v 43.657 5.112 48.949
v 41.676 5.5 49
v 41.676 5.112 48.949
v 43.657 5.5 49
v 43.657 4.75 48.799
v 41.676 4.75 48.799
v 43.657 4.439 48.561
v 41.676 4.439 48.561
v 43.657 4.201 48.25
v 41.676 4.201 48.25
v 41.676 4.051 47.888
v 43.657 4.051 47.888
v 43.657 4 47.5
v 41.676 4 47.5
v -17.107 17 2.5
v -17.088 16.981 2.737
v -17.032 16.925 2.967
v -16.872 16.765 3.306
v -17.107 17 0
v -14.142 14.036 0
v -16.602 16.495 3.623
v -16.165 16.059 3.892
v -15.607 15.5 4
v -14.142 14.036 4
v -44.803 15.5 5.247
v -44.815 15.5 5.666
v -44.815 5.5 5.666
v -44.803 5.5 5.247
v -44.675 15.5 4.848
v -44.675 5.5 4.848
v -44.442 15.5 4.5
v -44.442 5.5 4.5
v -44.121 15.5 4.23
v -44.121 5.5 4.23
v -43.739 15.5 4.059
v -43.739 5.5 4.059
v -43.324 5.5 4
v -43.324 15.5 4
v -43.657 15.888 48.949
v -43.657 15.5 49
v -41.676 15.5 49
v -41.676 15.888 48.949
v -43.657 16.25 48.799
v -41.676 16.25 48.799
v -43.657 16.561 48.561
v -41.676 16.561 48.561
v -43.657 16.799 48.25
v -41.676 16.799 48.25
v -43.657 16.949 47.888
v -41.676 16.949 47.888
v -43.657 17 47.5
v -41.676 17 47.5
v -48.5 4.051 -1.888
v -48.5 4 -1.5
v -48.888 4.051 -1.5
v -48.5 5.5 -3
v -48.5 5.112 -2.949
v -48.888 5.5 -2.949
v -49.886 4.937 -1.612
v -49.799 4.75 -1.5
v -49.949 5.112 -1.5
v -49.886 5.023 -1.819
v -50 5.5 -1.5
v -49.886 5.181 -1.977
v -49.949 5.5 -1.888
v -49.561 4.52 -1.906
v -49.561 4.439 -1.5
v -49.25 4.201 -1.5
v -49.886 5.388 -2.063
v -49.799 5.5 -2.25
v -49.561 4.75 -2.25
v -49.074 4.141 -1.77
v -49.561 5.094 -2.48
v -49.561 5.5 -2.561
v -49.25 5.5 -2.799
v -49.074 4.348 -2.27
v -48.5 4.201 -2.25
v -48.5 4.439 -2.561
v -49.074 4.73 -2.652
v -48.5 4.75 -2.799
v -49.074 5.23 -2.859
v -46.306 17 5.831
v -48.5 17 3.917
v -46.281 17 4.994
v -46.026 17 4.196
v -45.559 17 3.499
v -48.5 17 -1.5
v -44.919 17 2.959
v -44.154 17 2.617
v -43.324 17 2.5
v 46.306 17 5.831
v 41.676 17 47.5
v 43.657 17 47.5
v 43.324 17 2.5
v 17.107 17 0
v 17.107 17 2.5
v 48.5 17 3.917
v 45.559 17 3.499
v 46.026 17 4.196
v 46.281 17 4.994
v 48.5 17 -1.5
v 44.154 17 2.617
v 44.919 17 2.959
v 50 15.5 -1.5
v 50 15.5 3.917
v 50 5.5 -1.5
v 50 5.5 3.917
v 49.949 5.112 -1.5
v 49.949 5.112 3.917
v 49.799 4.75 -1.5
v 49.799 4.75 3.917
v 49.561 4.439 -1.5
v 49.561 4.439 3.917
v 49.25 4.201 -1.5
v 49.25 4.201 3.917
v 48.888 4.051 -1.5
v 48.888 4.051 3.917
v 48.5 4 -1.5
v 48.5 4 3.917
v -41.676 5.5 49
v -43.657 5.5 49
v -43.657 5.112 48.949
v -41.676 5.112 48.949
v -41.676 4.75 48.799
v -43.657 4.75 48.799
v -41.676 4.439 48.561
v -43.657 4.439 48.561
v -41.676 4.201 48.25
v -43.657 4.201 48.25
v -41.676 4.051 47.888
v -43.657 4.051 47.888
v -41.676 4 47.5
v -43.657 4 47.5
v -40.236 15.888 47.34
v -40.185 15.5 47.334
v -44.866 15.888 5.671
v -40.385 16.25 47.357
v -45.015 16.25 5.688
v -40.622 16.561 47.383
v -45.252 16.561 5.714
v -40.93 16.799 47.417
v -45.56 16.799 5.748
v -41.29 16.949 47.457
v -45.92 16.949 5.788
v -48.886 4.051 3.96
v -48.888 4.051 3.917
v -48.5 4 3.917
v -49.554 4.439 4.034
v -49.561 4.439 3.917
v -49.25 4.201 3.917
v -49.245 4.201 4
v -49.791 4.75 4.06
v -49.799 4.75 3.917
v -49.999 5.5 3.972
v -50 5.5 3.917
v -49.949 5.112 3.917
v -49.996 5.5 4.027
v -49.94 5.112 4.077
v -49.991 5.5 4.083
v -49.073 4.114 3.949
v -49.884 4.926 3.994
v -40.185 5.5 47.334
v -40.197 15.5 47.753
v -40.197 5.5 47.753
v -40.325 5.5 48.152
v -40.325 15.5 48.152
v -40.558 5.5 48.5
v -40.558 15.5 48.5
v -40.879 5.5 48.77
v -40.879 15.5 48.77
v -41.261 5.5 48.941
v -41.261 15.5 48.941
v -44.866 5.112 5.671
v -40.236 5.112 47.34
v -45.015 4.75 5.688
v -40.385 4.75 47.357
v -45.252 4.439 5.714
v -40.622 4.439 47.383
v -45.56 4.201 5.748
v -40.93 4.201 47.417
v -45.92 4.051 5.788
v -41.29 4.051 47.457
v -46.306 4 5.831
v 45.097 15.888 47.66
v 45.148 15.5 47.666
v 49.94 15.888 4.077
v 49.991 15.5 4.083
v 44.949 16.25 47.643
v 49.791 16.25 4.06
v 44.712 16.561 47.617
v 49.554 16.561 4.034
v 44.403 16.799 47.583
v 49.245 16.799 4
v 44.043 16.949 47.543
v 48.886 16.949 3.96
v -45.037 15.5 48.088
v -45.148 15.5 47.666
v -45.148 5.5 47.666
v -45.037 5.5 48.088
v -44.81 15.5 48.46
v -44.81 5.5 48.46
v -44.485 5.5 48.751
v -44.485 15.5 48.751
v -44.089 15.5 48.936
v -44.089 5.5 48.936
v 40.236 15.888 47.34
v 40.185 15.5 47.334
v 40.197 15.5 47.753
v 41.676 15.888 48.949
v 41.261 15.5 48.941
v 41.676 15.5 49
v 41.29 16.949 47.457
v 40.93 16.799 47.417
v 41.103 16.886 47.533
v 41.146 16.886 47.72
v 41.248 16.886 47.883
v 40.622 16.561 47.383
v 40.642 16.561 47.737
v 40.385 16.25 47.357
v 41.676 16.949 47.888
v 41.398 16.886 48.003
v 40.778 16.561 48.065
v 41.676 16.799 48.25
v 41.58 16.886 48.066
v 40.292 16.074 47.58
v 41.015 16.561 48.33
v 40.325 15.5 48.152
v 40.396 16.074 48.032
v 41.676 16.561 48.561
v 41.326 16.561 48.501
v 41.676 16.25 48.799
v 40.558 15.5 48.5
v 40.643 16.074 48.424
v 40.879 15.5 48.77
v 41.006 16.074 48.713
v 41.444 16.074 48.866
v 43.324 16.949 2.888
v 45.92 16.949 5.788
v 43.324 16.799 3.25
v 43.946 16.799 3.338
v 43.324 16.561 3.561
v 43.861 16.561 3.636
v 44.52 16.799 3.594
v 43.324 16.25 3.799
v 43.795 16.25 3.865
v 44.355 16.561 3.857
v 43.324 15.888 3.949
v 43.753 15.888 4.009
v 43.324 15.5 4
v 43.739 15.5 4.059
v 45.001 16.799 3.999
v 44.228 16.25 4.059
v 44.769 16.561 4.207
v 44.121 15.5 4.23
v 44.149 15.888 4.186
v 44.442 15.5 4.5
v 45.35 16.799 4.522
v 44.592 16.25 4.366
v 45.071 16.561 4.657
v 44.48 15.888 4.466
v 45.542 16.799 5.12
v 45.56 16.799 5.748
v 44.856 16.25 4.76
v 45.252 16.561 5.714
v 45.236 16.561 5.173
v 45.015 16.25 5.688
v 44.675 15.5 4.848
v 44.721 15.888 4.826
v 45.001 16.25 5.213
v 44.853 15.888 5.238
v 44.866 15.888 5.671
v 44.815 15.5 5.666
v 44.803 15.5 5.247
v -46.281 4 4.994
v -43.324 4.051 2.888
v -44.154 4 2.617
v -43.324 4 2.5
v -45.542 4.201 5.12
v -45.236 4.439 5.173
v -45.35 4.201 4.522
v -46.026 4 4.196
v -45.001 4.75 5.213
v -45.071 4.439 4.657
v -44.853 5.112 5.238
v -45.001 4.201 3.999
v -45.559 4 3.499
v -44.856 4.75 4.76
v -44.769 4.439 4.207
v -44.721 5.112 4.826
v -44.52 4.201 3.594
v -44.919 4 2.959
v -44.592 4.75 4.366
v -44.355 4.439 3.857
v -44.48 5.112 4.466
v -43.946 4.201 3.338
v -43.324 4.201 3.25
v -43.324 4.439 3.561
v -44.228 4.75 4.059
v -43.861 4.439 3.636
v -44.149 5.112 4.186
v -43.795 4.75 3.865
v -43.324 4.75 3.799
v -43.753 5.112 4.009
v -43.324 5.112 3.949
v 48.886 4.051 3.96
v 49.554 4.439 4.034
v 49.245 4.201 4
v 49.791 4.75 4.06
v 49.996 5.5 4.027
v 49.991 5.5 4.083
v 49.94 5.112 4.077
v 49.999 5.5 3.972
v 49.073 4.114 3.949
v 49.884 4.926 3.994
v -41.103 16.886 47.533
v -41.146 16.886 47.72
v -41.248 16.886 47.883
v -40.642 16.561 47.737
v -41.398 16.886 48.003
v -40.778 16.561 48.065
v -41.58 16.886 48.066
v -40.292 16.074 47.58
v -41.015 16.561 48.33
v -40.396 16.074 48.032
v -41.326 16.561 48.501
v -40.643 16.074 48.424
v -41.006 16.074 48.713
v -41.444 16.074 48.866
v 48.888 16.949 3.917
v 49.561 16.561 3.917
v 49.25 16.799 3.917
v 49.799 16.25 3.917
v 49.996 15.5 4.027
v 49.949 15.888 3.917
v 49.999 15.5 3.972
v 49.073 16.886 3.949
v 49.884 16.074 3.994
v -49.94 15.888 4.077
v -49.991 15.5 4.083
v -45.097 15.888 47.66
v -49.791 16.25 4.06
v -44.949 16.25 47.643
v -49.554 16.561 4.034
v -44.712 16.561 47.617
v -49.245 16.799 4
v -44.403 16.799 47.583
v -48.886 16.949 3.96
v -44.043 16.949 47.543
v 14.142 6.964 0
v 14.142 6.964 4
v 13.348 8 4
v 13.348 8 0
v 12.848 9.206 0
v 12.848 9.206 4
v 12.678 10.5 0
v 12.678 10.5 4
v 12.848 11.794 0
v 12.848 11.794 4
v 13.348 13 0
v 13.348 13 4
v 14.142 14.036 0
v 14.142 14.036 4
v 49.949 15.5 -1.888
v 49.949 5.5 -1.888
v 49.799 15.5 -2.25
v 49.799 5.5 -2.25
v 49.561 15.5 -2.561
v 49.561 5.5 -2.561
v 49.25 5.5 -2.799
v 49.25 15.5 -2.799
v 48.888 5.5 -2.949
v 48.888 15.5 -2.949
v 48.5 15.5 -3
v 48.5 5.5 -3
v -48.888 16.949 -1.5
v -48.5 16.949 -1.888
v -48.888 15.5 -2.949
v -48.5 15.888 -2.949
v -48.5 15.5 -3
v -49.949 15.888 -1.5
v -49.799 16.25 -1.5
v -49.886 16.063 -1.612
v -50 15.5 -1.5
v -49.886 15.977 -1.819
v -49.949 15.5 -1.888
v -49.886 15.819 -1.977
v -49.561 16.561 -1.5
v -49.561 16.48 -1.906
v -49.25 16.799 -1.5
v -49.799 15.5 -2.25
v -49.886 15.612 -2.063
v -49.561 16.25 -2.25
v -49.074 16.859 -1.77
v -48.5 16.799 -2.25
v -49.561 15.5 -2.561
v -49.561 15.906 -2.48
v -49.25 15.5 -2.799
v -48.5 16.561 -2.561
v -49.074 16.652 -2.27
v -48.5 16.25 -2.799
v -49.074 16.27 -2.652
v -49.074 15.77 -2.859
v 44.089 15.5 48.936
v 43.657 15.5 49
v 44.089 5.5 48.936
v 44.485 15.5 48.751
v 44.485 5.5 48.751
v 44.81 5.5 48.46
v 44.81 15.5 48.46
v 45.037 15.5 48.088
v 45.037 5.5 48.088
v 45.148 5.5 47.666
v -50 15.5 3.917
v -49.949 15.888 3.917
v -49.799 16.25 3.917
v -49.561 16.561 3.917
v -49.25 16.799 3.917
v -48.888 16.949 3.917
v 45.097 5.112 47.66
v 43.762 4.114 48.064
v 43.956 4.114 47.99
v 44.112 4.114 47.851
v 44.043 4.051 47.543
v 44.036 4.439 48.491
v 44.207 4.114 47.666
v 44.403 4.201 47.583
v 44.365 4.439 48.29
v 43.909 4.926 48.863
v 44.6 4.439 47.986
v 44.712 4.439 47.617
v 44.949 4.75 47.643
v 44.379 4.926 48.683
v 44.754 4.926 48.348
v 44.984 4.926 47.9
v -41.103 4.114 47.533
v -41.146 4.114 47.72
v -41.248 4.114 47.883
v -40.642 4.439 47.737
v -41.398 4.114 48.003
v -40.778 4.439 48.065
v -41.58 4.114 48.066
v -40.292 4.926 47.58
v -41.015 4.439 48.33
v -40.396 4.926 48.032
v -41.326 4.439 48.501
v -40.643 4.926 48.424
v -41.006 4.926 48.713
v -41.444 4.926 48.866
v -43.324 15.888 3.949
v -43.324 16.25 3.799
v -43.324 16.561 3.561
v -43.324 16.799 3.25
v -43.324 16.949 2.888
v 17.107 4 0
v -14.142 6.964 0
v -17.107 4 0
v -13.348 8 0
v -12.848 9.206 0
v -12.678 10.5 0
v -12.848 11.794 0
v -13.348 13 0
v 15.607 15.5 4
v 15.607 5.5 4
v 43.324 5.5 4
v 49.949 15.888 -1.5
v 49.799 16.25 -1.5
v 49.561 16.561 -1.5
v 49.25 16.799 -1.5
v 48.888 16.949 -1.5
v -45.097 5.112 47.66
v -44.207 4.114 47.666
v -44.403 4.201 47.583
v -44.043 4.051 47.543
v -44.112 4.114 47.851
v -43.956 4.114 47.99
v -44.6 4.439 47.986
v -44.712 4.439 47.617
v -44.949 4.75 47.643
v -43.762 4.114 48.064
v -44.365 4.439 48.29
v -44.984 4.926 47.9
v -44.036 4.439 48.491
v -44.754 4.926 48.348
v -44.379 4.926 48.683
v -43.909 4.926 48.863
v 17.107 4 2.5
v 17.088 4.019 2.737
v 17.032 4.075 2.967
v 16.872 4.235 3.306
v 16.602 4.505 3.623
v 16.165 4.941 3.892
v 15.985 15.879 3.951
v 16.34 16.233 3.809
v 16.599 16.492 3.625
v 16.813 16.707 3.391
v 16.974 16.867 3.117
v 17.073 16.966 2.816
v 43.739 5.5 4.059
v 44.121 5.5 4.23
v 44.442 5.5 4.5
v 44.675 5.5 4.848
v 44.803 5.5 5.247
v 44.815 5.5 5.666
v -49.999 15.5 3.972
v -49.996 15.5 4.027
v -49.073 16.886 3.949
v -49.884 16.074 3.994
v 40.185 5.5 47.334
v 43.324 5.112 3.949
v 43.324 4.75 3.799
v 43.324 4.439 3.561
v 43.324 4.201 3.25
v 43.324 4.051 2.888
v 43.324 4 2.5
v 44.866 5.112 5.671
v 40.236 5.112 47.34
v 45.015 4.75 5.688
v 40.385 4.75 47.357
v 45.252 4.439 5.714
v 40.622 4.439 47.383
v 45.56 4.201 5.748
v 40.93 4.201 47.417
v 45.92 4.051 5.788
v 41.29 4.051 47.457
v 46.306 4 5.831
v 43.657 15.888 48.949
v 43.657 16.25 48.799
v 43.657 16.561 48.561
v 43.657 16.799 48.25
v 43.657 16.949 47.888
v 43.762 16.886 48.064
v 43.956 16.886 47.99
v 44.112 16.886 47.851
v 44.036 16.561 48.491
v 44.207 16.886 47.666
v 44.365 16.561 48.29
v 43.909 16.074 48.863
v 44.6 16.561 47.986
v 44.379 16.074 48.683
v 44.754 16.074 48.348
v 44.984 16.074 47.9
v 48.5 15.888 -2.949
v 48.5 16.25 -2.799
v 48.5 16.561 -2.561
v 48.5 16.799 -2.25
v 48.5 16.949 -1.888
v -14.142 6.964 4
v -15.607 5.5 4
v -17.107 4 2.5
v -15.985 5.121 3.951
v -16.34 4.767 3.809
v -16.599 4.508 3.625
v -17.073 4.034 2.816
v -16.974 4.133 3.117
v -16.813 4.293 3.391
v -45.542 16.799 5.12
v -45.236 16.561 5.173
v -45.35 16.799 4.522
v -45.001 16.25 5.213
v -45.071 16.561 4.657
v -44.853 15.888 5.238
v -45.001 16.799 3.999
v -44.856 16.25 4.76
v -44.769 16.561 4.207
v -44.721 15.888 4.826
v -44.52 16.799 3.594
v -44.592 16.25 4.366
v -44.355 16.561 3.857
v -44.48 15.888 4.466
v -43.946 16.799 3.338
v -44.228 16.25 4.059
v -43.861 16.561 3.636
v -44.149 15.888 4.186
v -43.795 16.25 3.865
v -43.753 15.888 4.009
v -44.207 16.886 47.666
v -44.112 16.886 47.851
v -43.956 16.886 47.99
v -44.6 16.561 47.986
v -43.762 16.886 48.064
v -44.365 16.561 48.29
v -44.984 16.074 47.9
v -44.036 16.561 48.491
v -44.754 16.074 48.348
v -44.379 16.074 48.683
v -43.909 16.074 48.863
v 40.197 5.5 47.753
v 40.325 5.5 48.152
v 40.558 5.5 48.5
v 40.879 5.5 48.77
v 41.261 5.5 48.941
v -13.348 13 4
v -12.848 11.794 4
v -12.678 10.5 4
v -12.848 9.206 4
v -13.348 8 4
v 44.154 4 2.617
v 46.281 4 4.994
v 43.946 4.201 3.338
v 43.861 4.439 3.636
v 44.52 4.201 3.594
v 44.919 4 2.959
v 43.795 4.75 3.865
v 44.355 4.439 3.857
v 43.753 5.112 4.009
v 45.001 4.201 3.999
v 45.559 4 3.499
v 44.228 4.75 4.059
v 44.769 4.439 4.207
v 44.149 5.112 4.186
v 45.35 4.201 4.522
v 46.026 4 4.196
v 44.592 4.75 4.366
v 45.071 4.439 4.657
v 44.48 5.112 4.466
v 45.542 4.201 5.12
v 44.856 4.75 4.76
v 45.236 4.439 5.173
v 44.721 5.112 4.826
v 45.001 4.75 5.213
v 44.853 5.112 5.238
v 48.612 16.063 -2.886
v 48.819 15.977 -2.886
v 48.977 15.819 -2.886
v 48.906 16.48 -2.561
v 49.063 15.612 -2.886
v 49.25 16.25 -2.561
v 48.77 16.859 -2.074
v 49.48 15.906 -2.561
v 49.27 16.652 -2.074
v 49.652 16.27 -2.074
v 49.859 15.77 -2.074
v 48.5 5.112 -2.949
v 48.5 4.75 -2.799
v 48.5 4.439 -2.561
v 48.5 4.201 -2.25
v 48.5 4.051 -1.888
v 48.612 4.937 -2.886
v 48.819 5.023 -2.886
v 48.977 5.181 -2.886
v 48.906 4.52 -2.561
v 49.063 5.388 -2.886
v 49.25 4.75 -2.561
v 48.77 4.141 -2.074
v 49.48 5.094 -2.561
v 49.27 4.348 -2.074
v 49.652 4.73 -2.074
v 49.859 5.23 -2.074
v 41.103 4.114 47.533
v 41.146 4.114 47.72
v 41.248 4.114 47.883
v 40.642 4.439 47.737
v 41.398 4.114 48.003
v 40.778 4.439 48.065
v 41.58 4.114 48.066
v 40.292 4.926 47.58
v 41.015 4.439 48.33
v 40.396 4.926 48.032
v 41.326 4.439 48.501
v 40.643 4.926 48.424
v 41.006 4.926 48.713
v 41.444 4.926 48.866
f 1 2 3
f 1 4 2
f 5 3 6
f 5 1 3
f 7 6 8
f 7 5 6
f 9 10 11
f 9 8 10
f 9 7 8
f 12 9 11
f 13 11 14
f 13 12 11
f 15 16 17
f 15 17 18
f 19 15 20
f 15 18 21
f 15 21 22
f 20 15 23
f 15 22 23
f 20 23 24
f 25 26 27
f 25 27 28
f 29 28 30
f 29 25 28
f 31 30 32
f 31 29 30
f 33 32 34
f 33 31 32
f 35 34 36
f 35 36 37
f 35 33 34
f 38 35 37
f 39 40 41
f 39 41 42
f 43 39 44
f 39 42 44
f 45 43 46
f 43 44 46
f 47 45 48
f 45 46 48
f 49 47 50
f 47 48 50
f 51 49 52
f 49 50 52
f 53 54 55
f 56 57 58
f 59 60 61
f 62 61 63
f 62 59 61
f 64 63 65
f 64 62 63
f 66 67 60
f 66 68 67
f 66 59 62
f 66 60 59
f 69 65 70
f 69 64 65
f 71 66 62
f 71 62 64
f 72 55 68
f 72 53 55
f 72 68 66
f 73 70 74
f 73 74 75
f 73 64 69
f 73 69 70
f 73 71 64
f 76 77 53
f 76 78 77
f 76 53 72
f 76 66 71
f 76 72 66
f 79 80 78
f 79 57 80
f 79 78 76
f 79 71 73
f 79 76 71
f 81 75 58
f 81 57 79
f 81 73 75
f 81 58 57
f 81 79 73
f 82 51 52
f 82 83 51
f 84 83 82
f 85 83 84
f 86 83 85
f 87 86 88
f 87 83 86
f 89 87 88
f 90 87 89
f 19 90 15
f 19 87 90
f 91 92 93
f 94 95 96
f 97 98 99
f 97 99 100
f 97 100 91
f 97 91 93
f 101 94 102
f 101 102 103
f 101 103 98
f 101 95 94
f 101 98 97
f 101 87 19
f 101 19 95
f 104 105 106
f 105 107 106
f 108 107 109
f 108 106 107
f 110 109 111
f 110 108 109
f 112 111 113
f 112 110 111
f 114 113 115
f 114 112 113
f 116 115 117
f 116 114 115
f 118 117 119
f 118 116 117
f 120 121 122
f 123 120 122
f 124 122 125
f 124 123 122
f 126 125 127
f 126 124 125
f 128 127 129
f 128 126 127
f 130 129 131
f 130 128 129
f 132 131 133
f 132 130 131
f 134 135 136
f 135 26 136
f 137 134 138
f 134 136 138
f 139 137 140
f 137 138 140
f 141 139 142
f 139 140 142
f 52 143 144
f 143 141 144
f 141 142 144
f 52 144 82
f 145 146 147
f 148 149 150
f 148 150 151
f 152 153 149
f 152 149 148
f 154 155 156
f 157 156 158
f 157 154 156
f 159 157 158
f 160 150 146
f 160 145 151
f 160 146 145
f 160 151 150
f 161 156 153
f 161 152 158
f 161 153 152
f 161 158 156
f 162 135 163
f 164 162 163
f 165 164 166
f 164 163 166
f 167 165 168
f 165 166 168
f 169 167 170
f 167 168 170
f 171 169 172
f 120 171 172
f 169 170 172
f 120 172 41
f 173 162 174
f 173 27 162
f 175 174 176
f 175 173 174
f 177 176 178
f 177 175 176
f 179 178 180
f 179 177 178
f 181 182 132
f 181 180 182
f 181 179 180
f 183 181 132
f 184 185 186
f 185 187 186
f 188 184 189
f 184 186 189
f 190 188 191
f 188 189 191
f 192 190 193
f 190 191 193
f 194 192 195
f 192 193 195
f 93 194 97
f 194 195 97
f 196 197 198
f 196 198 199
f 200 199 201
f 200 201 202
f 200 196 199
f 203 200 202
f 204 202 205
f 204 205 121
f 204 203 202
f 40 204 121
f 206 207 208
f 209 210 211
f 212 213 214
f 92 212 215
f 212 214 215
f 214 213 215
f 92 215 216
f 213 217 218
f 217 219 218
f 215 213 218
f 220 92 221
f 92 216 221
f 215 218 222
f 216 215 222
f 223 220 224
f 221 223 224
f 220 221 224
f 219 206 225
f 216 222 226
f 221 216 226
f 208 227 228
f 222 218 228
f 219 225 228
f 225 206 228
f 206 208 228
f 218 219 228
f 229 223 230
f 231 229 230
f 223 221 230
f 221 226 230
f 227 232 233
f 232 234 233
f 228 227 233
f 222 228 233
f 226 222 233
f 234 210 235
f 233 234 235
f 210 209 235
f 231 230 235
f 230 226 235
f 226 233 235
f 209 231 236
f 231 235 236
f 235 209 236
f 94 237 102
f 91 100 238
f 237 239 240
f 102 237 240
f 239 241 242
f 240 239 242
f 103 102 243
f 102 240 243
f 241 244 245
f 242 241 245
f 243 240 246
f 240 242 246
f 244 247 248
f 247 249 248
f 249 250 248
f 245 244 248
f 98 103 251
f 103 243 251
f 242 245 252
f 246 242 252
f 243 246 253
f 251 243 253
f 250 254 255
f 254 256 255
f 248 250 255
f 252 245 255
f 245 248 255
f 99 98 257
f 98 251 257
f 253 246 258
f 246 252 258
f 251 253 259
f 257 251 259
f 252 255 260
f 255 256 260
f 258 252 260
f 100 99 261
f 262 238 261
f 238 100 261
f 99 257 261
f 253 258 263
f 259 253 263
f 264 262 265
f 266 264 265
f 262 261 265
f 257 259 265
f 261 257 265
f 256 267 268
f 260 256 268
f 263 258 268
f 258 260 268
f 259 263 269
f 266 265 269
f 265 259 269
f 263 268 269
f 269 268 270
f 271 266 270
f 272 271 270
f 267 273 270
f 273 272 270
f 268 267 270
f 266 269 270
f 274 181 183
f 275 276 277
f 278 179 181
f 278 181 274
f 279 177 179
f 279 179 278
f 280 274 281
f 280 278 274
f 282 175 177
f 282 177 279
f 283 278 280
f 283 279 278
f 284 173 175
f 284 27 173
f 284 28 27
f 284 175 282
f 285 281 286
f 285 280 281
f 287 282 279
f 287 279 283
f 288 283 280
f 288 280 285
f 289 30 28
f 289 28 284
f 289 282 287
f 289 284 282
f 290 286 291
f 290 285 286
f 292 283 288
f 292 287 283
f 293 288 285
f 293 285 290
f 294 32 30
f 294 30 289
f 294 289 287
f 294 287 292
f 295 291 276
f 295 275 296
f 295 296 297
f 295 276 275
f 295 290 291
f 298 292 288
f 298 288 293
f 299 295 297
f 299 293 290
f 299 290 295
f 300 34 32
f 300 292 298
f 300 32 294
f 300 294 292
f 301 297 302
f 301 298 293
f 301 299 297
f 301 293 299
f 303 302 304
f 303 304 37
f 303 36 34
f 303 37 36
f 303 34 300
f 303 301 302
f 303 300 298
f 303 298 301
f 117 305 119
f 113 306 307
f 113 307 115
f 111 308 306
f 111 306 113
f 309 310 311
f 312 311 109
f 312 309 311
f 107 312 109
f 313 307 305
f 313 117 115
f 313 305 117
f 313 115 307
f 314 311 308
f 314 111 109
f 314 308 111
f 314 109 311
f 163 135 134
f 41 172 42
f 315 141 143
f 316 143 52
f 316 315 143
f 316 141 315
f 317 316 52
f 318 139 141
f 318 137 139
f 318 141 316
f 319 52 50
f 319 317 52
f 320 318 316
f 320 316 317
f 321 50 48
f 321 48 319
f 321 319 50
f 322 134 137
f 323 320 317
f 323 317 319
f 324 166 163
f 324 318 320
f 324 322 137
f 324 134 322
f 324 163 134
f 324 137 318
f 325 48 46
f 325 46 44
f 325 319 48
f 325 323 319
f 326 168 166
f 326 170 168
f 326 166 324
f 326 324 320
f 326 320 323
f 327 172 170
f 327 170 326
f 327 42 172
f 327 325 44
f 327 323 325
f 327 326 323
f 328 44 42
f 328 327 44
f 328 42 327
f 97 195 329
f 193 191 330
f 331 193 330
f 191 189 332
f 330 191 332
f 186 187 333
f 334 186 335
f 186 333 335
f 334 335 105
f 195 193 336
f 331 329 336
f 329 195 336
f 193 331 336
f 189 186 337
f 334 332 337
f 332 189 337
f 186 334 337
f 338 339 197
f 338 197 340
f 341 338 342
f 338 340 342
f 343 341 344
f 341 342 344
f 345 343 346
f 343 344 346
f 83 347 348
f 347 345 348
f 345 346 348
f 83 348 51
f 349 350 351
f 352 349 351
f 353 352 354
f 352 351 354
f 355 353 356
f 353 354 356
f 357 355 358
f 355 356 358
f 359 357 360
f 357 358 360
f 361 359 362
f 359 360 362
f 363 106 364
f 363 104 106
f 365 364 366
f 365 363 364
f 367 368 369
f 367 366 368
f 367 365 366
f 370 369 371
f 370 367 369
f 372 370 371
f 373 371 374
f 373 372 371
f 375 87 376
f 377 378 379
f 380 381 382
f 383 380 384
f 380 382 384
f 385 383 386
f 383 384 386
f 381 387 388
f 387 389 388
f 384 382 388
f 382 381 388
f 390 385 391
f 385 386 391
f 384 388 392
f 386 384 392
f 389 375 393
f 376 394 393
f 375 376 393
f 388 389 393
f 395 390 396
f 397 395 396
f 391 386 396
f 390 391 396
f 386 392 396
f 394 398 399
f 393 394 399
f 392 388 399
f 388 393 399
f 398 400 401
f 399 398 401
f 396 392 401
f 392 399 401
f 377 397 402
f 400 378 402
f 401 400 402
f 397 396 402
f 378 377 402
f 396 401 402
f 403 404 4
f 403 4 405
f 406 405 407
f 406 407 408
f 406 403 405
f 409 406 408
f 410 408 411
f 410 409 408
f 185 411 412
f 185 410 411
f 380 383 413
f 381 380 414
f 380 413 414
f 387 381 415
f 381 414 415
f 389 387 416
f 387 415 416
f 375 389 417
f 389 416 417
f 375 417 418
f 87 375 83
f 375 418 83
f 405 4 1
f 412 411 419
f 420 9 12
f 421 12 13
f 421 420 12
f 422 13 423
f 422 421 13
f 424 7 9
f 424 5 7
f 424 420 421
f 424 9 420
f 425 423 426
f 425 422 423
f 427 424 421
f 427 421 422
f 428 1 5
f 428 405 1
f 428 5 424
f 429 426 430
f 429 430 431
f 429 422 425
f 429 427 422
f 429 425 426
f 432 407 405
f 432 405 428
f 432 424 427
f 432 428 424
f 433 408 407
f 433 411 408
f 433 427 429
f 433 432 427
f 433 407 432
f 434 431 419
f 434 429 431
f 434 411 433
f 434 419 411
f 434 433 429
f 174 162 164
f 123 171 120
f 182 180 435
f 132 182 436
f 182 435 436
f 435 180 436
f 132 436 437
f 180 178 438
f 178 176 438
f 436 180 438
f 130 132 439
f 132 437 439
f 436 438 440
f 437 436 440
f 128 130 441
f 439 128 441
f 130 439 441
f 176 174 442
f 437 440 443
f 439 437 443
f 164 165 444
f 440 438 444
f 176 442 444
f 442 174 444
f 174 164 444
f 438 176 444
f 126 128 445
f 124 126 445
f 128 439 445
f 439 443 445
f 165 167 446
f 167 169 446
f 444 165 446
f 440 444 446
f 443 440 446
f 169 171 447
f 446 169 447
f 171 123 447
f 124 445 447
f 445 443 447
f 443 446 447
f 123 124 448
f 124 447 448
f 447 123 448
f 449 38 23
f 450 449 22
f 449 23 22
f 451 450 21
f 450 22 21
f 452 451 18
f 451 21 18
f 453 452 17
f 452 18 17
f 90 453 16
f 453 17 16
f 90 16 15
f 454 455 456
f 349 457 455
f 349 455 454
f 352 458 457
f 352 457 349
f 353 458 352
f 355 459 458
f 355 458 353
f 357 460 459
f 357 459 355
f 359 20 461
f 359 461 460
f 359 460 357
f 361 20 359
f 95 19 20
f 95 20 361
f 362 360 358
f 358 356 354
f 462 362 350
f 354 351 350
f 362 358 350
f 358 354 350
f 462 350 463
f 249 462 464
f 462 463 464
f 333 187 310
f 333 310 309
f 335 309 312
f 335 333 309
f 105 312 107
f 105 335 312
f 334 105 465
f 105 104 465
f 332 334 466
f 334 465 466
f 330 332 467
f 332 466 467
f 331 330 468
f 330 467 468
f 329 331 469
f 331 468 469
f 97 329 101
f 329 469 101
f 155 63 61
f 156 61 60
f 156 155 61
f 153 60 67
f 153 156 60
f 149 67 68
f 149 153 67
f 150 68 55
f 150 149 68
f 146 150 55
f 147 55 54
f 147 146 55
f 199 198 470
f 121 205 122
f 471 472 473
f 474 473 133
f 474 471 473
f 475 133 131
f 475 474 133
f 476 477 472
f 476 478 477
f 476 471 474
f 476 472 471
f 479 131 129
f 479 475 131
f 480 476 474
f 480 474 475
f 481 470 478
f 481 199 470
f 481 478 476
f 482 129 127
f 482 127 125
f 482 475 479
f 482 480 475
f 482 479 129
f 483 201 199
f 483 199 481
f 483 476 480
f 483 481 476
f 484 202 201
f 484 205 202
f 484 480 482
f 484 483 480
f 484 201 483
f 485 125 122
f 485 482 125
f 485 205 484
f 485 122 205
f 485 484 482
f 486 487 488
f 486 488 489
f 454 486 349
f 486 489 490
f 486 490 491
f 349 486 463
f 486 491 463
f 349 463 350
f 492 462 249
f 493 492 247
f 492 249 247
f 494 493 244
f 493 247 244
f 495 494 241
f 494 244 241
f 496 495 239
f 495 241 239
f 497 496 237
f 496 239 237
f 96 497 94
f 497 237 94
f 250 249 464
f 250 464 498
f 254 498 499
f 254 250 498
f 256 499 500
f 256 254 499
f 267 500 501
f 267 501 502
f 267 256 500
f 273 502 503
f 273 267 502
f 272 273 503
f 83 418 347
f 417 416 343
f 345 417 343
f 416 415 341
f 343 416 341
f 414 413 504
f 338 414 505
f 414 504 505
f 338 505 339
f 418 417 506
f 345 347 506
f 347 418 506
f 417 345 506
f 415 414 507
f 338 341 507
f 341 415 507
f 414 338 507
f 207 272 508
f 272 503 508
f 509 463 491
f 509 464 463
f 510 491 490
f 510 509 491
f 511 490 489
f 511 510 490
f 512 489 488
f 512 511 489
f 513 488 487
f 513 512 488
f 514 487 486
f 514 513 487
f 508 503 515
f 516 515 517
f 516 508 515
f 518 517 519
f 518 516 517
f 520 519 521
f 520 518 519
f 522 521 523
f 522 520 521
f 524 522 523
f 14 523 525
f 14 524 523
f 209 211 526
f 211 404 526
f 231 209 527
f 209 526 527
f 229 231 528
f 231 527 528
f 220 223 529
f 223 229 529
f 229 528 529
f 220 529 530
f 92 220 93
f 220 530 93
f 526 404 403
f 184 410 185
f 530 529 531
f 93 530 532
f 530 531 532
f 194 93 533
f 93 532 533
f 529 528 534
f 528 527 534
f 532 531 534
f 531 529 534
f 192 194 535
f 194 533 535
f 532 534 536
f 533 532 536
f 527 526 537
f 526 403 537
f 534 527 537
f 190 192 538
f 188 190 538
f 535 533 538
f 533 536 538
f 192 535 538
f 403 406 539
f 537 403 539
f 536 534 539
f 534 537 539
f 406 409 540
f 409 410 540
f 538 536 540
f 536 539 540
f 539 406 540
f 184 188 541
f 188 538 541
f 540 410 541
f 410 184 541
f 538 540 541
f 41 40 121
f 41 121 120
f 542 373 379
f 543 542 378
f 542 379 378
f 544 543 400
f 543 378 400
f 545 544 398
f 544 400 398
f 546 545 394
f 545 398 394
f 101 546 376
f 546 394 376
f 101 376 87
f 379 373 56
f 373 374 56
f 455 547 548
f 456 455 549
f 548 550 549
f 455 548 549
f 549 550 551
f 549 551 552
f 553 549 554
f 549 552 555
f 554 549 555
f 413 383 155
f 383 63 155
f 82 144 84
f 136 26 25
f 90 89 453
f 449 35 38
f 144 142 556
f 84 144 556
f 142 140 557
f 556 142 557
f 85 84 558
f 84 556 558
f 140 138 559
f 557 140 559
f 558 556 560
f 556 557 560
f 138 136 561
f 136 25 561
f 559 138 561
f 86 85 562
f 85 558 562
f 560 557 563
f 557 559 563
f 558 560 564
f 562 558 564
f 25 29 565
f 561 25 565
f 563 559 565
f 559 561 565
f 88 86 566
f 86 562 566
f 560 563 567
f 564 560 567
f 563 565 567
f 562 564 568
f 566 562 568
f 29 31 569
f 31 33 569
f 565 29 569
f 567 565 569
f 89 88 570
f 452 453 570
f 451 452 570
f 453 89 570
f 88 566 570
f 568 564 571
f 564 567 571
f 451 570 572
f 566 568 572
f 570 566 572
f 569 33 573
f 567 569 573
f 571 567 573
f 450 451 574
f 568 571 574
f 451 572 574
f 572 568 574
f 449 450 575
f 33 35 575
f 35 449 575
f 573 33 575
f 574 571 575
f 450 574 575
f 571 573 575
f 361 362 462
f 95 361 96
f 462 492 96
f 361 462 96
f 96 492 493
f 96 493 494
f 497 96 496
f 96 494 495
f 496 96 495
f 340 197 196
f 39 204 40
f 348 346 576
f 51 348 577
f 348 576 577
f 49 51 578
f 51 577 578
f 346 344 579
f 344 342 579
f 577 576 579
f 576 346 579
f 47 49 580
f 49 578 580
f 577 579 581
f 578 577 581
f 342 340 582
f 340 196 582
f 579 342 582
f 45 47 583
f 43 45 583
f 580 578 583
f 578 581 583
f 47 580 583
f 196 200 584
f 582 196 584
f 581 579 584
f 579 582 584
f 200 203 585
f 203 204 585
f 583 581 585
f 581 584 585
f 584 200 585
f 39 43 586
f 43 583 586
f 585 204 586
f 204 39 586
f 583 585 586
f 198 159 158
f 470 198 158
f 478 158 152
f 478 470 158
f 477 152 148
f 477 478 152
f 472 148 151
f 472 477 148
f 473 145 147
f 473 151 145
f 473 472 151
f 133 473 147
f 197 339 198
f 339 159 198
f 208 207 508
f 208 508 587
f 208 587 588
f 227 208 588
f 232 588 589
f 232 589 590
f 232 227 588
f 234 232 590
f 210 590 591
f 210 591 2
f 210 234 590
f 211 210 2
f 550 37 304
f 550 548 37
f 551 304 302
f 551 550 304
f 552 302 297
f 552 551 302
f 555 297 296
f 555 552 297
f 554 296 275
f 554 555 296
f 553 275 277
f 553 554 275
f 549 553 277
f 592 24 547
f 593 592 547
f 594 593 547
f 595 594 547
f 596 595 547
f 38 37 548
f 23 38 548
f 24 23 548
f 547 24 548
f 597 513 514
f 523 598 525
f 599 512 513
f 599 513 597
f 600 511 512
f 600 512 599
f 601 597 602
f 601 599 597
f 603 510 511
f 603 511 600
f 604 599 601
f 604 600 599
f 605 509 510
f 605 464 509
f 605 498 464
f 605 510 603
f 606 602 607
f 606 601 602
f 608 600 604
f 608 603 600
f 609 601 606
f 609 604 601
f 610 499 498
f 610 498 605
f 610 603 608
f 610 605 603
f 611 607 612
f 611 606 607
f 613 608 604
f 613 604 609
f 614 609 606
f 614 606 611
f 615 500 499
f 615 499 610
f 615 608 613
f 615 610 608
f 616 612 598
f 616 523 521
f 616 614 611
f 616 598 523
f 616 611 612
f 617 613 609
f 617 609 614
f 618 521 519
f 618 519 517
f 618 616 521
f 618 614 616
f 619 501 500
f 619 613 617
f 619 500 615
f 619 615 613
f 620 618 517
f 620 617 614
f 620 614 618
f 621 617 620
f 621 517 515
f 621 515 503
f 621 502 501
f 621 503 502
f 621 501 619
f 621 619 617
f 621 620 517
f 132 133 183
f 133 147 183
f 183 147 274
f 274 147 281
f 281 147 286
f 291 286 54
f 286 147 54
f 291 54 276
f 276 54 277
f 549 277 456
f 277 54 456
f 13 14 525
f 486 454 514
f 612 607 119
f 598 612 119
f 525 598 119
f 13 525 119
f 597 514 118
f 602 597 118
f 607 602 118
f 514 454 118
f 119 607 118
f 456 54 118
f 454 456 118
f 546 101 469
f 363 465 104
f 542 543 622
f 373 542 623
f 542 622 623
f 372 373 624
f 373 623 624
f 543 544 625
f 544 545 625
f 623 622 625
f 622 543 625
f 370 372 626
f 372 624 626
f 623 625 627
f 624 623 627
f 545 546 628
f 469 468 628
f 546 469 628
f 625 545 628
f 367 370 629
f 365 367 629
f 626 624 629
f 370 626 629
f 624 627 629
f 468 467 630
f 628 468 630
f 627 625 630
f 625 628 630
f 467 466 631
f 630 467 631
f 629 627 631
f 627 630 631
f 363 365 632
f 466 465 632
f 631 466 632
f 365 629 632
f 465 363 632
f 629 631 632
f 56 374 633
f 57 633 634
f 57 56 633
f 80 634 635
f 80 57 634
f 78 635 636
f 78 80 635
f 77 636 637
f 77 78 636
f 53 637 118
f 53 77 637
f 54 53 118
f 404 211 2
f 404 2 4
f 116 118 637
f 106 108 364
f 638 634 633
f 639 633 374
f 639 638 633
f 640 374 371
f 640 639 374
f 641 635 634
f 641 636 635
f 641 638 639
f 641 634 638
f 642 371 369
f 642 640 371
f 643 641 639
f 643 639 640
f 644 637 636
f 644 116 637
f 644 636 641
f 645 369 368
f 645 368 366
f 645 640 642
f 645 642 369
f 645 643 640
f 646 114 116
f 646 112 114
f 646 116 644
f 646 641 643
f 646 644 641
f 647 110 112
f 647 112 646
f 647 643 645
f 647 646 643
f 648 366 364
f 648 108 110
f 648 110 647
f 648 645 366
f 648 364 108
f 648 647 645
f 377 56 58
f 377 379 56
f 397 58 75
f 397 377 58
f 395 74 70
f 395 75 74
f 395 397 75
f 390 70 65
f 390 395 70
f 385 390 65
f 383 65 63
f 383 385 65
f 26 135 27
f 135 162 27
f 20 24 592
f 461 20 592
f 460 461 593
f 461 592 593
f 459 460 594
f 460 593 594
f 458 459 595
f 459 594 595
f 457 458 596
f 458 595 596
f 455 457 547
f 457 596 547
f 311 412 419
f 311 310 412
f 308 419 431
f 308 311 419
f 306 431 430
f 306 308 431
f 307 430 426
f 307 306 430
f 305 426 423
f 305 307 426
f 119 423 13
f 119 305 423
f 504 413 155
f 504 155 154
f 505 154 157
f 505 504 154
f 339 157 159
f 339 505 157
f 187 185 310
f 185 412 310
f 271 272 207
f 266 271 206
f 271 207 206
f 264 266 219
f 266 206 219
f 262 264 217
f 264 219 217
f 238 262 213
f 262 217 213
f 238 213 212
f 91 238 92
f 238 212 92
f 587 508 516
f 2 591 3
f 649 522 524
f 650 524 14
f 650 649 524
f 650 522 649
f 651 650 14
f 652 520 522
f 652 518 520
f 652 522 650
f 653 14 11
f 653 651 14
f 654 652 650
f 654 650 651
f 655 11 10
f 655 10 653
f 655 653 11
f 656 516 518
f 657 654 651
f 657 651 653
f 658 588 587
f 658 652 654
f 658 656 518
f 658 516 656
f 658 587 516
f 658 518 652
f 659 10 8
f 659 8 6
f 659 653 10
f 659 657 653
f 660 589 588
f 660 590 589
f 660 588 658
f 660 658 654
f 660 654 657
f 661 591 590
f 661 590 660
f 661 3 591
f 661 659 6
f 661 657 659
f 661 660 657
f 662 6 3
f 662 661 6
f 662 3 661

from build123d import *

# Parameters (mm, degrees)
F1_DEPTH = 13
F2_R     = 1.5
F4_DEPTH = 4
F5_ANGLE = -90


with BuildPart() as f1:
    # F0 (on Top) → F1 (new body)
    with BuildSketch(Plane.XY):
        Polygon((-40, -45), (-45, 0), (0, 0), (45, 0), (40, -45), (45, -45), (50, 0), (50, 7), (45, 7), (44.8581193677, 7), (-44.8581193677, 7), (-45, 7), (-50, 7), (-50, 0), (-45, -45), align=None)
    extrude(amount=F1_DEPTH)

    # F2
    f2_edges = [f1.edges().sort_by_distance(p)[0] for p in [
        (-42.5, -22.5, 13),
        (0, 0, 13),
        (42.5, -22.5, 13),
        (42.5, -45, 13),
        (47.5, -22.5, 13),
        (50, 3.5, 13),
        (0, 7, 13),
        (-50, 3.5, 13),
        (-47.5, -22.5, 13),
        (-42.5, -45, 13),
        (-42.5, -22.5, 0),
        (0, 0, 0),
        (42.5, -22.5, 0),
        (42.5, -45, 0),
        (47.5, -22.5, 0),
        (50, 3.5, 0),
        (0, 7, 0),
        (-50, 3.5, 0),
        (-47.5, -22.5, 0),
        (-42.5, -45, 0),
        (40, -45, 6.5),
        (45, -45, 6.5),
        (-45, -45, 6.5),
        (-40, -45, 6.5),
        (-45, 0, 6.5),
        (45, 0, 6.5),
        (-50, 7, 6.5),
        (-50, 0, 6.5),
        (50, 0, 6.5),
        (50, 7, 6.5),
    ]]
    fillet(f2_edges, radius=F2_R)

    # F3 (on face) → F4 (cut)
    with BuildSketch(Plane.XZ):
        with BuildLine():
            Line((-14.1421356237, 2.9644660941), (-15.6066017178, 1.5))
            Line((-15.6066017178, 1.5), (15.6066017178, 1.5))
            Line((15.6066017178, 1.5), (14.1421356237, 2.9644660941))
            ThreePointArc((14.1421356237, 2.9644660941), (12.6776695297, 6.5), (14.1421356237, 10.0355339059))
            Line((14.1421356237, 10.0355339059), (15.6066017178, 11.5))
            Line((15.6066017178, 11.5), (-15.6066017178, 11.5))
            Line((-15.6066017178, 11.5), (-14.1421356237, 10.0355339059))
            ThreePointArc((-14.1421356237, 10.0355339059), (-12.6776695297, 6.5), (-14.1421356237, 2.9644660941))
        make_face()
        Polygon((-24.8033008589, 20.6966991411), (-15.6066017178, 11.5), (15.6066017178, 11.5), (24.8033008589, 20.6966991411), (19.5, 26), (14.1966991411, 31.3033008589), (0, 17.1066017178), (-14.1966991411, 31.3033008589), (-19.5, 26), align=None)
        Polygon((-24.8033008589, -7.6966991411), (-19.5, -13), (-14.1966991411, -18.3033008589), (0, -4.1066017178), (14.1966991411, -18.3033008589), (19.5, -13), (24.8033008589, -7.6966991411), (15.6066017178, 1.5), (-15.6066017178, 1.5), align=None)
    extrude(amount=-F4_DEPTH, mode=Mode.SUBTRACT)


with BuildPart() as f1_1:
    # F5: moved
    add(f1.part.rotate(Axis((0, 4, 0), (1, 0, 0)), F5_ANGLE))


solid = f1_1.part
